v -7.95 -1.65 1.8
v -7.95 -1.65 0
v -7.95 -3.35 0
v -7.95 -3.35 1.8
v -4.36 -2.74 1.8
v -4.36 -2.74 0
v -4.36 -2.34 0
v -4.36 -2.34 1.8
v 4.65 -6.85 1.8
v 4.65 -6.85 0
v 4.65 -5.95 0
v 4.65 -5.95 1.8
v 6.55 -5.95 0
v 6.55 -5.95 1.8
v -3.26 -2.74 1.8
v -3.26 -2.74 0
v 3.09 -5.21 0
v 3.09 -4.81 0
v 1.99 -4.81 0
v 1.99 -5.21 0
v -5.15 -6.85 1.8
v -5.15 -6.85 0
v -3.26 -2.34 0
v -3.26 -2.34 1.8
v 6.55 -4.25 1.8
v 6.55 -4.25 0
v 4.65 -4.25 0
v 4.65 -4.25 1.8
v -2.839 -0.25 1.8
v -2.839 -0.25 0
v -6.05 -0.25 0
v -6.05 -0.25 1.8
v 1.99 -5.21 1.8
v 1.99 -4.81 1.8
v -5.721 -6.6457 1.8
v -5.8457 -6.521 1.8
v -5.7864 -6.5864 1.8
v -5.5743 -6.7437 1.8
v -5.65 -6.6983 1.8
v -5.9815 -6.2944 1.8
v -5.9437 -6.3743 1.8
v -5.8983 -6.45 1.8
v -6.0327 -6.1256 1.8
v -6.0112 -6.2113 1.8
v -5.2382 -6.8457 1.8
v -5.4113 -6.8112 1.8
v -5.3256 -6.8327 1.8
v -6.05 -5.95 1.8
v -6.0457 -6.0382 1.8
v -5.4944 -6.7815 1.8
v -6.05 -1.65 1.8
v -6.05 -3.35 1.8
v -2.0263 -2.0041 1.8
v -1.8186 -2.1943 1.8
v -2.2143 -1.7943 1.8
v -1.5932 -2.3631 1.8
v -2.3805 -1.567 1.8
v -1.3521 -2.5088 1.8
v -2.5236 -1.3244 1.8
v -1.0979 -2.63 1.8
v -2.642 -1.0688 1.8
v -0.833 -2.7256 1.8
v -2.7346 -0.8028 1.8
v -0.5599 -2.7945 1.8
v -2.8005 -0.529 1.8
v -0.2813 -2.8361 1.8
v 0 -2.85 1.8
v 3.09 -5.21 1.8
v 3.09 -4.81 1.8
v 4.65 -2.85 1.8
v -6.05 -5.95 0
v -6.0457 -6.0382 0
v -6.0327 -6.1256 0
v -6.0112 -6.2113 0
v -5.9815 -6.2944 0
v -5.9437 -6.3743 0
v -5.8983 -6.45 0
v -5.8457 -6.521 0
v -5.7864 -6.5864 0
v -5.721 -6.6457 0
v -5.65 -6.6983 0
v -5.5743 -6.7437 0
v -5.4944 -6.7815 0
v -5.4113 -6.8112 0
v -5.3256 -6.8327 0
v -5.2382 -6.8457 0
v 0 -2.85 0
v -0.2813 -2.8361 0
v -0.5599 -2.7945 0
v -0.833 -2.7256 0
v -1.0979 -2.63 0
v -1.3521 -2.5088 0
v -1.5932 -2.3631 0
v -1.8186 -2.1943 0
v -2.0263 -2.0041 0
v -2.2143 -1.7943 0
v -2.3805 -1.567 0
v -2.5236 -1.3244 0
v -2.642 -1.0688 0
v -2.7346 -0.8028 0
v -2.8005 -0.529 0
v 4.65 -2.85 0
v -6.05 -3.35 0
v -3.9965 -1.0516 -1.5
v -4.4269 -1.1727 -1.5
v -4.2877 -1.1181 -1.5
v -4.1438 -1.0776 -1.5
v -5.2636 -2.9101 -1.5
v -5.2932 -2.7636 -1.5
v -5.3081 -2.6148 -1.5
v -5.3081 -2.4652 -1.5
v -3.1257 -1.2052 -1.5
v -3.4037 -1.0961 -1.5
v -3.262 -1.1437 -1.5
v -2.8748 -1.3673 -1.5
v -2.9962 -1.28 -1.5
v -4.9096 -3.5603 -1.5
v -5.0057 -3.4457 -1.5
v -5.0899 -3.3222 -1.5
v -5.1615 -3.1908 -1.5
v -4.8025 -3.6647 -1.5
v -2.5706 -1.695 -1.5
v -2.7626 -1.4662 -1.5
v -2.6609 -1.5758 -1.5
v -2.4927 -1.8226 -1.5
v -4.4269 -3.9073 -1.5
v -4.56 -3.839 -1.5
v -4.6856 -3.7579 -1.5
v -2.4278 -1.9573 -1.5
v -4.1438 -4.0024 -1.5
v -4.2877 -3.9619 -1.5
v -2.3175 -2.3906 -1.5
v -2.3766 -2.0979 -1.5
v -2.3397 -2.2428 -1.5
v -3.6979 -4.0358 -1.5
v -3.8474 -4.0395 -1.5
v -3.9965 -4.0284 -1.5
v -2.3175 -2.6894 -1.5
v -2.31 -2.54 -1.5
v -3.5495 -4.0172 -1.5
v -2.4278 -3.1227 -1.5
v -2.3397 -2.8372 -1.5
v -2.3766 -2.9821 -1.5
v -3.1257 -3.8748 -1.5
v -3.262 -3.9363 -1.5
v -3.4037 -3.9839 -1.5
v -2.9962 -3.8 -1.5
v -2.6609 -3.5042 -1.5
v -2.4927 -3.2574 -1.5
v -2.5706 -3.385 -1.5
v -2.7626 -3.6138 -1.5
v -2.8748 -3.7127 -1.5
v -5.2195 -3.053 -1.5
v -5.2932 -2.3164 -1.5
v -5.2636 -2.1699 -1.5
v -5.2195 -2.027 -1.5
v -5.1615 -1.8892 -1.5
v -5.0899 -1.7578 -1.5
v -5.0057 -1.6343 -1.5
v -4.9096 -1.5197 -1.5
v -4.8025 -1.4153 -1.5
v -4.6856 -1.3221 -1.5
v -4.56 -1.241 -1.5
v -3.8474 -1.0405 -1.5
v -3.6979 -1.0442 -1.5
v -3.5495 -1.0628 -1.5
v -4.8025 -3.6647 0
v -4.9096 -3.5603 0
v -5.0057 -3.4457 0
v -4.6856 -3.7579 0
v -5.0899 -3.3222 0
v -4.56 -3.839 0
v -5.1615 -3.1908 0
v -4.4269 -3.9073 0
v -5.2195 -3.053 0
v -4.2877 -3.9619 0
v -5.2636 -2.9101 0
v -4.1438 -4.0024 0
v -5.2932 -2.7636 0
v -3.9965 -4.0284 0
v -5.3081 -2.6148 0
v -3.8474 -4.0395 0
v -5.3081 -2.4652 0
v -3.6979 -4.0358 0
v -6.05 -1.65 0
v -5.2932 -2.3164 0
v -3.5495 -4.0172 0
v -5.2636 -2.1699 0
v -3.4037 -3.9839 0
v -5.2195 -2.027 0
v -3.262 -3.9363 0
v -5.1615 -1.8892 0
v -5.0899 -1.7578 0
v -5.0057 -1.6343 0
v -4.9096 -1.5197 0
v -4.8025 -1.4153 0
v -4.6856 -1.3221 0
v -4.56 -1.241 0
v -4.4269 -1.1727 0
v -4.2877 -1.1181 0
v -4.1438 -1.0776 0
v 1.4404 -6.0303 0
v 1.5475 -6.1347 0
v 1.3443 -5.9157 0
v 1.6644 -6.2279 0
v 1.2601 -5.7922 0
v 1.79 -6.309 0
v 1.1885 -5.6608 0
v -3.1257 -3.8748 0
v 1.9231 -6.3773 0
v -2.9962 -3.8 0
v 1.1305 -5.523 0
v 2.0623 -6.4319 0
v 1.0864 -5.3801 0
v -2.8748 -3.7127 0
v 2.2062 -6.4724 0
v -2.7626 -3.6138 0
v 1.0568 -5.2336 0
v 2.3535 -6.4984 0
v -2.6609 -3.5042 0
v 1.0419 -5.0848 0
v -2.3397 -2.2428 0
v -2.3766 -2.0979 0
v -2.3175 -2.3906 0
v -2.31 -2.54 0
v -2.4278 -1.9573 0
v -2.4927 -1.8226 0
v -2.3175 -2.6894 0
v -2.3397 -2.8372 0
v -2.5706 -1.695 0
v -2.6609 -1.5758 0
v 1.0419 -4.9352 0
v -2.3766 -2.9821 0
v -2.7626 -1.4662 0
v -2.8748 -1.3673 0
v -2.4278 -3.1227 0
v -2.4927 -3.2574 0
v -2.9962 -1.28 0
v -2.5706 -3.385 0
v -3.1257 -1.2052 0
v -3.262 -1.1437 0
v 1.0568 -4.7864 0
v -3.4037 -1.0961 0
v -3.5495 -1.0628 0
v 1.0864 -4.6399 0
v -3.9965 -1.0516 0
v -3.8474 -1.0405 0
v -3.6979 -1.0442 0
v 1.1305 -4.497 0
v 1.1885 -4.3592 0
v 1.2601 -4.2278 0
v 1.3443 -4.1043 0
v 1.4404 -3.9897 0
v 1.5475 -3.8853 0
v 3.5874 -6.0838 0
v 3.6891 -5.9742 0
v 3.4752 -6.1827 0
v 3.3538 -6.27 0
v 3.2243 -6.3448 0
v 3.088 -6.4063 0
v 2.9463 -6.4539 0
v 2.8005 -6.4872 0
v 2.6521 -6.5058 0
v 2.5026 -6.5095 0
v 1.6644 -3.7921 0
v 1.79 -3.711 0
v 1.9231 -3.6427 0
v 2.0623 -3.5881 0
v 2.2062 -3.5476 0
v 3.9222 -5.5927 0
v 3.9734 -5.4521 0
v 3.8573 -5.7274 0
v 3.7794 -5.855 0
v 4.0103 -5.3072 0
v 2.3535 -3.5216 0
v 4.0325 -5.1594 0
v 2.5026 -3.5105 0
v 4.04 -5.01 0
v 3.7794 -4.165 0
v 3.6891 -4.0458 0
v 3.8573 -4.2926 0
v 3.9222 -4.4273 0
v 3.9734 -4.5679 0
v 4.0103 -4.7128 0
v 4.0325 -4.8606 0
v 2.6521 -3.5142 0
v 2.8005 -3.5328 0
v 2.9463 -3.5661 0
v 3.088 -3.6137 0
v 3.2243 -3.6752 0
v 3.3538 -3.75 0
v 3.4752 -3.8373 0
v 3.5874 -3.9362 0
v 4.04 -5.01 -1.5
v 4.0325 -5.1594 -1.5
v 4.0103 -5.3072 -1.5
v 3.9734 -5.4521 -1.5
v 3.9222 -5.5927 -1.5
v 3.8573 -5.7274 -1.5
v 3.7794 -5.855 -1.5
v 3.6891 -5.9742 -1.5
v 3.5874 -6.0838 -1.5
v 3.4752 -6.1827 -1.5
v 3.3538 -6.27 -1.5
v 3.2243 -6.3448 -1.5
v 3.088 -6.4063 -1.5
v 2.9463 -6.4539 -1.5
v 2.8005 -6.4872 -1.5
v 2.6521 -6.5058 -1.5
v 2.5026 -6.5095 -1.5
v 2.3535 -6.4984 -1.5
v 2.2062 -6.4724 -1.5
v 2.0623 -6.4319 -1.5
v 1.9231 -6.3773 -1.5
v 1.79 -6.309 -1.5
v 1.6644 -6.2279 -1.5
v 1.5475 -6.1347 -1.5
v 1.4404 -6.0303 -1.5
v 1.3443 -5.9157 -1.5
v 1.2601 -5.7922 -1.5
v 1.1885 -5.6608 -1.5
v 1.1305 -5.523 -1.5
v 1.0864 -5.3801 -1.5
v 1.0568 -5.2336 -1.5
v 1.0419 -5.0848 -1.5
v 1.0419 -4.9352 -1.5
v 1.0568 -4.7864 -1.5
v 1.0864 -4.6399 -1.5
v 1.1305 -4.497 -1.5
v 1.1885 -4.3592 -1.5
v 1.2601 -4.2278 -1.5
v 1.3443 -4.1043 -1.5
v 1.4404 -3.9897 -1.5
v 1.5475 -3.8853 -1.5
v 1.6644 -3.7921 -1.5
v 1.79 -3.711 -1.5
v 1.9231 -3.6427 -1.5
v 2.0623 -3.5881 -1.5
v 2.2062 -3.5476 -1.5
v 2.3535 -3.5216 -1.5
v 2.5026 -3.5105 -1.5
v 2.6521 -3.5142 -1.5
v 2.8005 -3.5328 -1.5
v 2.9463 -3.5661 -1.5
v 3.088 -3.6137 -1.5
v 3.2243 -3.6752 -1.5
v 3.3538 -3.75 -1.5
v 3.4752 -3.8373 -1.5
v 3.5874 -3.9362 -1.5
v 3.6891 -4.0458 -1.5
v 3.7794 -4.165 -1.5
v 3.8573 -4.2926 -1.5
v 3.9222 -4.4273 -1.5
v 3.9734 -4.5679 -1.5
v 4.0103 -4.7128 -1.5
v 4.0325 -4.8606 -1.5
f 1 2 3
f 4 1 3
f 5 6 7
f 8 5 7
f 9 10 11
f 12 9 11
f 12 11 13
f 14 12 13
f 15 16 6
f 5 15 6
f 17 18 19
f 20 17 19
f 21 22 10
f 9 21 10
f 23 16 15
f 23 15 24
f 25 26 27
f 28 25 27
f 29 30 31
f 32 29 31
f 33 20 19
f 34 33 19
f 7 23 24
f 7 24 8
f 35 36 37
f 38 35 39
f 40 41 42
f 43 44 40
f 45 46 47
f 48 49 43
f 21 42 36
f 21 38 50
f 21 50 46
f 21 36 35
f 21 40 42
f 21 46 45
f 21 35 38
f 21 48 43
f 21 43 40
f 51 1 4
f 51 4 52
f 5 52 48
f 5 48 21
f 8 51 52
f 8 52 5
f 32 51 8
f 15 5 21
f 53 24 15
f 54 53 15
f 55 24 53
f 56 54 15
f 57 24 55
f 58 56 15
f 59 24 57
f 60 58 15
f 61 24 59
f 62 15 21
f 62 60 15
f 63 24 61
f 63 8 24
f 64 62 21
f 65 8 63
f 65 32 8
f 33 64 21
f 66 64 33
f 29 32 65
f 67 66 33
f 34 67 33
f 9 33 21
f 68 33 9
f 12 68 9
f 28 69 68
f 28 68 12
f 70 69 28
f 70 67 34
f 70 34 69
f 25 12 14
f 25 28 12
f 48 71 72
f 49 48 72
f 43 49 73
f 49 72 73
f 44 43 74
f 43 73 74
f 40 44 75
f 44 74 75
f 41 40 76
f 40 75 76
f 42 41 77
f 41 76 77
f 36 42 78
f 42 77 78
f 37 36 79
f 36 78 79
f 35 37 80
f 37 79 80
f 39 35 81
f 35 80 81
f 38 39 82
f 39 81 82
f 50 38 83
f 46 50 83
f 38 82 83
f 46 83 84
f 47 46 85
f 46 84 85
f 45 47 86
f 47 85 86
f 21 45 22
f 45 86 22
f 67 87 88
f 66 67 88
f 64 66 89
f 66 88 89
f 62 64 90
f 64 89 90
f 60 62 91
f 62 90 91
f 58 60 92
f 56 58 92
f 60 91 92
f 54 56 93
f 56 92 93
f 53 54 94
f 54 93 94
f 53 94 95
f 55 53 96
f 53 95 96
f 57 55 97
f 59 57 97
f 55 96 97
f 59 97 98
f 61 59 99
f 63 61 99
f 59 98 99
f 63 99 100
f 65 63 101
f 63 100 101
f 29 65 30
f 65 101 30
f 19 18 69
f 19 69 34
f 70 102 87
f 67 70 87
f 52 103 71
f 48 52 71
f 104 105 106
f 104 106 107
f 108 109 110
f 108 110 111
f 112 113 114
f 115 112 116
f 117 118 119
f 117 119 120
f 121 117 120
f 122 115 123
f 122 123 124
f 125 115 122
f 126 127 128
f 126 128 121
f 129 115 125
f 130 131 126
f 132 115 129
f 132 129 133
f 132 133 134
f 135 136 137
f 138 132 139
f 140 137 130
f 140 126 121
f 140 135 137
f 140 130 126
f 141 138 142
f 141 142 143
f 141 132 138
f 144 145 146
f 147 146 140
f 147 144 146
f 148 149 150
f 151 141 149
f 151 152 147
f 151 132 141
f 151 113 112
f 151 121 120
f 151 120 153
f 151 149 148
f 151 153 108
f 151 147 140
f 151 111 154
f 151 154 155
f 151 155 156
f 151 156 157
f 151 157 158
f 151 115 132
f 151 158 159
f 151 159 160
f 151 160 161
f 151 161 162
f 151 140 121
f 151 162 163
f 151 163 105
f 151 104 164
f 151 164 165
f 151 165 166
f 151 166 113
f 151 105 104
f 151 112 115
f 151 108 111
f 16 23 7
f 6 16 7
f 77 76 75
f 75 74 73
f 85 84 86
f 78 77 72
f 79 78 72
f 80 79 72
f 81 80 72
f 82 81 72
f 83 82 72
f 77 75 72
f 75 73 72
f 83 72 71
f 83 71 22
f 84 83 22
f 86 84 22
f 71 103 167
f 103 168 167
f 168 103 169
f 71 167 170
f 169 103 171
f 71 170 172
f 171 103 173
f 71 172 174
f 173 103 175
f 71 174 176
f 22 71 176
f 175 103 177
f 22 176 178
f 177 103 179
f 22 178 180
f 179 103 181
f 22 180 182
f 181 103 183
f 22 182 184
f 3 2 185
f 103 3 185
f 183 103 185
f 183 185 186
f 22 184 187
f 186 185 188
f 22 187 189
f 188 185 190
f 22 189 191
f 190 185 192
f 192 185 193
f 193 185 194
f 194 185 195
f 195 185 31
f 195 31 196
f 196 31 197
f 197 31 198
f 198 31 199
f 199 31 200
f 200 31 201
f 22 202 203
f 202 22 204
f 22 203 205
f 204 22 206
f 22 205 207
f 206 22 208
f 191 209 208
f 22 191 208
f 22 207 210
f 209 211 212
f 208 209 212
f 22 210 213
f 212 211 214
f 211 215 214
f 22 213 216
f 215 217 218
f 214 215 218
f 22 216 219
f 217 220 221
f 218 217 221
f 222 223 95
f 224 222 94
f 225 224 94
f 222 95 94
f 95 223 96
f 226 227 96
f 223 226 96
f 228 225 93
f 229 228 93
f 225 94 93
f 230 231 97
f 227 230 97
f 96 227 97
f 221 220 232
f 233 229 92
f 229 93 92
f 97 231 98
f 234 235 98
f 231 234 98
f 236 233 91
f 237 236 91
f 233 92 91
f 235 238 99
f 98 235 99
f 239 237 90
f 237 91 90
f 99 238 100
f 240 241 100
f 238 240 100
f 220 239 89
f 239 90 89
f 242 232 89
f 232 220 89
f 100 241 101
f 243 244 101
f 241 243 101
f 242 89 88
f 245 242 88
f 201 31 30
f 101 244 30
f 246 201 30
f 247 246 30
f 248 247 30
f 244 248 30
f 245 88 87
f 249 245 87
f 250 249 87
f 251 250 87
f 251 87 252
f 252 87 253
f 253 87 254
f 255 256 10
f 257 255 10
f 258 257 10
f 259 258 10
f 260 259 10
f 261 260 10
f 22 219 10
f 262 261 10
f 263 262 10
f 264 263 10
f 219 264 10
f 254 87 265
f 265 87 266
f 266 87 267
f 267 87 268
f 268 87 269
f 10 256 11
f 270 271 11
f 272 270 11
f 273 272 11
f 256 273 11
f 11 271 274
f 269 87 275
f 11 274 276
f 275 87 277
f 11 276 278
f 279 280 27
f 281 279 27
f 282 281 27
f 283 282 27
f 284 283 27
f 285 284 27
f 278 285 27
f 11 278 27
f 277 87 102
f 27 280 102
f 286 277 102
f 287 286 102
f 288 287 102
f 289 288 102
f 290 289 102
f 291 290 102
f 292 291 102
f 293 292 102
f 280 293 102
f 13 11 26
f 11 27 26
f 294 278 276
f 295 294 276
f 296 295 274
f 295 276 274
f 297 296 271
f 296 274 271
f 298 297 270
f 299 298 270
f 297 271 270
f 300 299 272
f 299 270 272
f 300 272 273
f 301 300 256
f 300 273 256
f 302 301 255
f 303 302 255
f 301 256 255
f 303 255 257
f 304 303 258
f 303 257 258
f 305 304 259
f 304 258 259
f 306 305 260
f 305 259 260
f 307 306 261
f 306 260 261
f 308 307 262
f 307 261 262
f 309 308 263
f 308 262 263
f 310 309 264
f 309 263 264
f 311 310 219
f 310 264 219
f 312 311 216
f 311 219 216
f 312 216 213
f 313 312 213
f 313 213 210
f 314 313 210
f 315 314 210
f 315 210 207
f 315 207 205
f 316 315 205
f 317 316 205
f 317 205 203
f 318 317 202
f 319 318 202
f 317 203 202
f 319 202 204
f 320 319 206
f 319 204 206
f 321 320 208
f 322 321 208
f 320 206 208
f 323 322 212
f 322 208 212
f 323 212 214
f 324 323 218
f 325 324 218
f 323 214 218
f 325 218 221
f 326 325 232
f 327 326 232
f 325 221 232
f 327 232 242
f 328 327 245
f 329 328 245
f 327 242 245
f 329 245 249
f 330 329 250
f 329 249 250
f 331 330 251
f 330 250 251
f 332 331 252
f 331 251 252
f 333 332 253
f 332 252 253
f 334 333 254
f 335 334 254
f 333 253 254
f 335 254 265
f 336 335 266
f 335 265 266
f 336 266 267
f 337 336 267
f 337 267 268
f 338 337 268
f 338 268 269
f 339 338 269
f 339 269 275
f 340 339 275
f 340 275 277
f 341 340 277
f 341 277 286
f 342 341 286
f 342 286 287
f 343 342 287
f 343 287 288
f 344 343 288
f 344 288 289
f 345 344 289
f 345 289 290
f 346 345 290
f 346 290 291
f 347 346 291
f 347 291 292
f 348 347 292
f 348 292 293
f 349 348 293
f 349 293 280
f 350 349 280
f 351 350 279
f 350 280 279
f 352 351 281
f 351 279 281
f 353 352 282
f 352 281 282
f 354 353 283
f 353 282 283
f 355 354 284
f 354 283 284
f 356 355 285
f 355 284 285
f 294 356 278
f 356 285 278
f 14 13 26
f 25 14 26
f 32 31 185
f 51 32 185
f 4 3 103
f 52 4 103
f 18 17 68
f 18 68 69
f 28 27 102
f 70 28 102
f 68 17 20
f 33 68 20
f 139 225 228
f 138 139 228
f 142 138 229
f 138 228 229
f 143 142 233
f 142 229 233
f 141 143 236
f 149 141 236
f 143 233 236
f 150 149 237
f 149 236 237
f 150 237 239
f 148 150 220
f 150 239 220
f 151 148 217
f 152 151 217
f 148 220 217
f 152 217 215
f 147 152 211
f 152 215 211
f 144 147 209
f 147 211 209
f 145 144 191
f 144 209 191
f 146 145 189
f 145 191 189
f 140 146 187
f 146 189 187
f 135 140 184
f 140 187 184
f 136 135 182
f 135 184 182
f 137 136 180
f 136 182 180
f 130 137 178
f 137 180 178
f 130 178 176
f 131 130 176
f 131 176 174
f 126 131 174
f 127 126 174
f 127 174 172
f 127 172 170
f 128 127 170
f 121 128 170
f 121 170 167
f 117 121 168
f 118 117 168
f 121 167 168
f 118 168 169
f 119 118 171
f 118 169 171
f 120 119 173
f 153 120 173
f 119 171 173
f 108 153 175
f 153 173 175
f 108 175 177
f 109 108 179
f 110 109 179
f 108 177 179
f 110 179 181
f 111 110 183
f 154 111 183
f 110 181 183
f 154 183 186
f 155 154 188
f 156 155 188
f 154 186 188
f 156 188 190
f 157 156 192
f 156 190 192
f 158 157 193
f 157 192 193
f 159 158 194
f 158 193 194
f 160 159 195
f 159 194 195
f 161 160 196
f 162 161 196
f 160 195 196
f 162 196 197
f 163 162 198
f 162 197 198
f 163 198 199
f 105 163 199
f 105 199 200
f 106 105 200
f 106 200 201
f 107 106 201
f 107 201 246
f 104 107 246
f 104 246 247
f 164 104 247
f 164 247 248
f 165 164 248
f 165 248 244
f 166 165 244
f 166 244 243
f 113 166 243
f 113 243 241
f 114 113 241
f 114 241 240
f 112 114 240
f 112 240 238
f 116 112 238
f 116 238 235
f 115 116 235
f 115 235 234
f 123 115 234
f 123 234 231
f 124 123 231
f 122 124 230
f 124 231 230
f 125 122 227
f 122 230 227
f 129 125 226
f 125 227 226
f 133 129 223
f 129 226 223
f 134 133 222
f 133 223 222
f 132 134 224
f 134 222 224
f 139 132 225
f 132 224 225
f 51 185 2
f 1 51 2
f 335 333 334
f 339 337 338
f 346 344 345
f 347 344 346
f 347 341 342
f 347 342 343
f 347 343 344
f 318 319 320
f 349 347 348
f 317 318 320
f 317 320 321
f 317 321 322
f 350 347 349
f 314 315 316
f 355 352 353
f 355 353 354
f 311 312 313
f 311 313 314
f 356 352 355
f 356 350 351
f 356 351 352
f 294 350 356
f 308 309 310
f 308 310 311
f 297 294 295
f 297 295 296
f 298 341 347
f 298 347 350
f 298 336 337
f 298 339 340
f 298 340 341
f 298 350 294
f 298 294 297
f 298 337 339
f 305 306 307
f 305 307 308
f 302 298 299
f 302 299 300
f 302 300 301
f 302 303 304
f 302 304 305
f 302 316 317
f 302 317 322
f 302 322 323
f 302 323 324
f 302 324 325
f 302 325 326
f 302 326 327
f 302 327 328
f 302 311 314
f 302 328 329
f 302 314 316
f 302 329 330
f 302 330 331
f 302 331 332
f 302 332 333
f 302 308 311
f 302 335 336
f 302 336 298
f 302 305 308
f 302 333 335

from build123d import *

# Parameters (mm, degrees)
EXTRUDE_1_DEPTH     = 1.8
SKETCH_2_R          = 1.5
EXTRUDE_2_DEPTH     = 1.5
SKETCH_2_3_W        = 1.1
SKETCH_2_3_H        = 0.4
CUT_EXTRUDE_1_DEPTH = 11.647300127


with BuildPart() as part:
    # 草图1 → 凸台-拉伸1 (new body)
    with BuildSketch(Plane.XY):
        with BuildLine():
            Line((-2.839013913, -0.25), (-6.05, -0.25))
            Line((-6.05, -0.25), (-6.05, -1.65))
            Line((-6.05, -1.65), (-7.95, -1.65))
            Line((-7.95, -1.65), (-7.95, -3.35))
            Line((-7.95, -3.35), (-6.05, -3.35))
            Line((-6.05, -3.35), (-6.05, -5.95))
            ThreePointArc((-6.05, -5.95), (-5.786396103, -6.586396103), (-5.15, -6.85))
            Line((-5.15, -6.85), (4.65, -6.85))
            Line((4.65, -6.85), (4.65, -5.95))
            Line((4.65, -5.95), (6.55, -5.95))
            Line((6.55, -5.95), (6.55, -4.25))
            Line((6.55, -4.25), (4.65, -4.25))
            Line((4.65, -4.25), (4.65, -2.85))
            Line((4.65, -2.85), (0, -2.85))
            ThreePointArc((0, -2.85), (-1.924837655, -2.101784956), (-2.839013913, -0.25))
        make_face()
    extrude(amount=EXTRUDE_1_DEPTH)

    # 草图2 → 凸台-拉伸2 (add)
    with BuildSketch(Plane(origin=(0, 0, 0), x_dir=(-1, 0, 0), z_dir=(0, 0, -1))):
        with Locations((-2.54, -5.01)):
            Circle(SKETCH_2_R)
        with Locations((3.81, -2.54)):
            Circle(SKETCH_2_R)
    extrude(amount=EXTRUDE_2_DEPTH)

    # 草图2<3> → 切除-拉伸1 (cut, through all)
    with BuildSketch(Plane(origin=(0, 0, 0), x_dir=(-1, 0, 0), z_dir=(0, 0, -1))):
        with Locations((-2.54, -5.01)):
            Rectangle(SKETCH_2_3_W, SKETCH_2_3_H)
        with Locations((3.81, -2.54)):
            Rectangle(SKETCH_2_3_W, SKETCH_2_3_H)
    extrude(amount=-CUT_EXTRUDE_1_DEPTH, mode=Mode.SUBTRACT)


solid = part.part
